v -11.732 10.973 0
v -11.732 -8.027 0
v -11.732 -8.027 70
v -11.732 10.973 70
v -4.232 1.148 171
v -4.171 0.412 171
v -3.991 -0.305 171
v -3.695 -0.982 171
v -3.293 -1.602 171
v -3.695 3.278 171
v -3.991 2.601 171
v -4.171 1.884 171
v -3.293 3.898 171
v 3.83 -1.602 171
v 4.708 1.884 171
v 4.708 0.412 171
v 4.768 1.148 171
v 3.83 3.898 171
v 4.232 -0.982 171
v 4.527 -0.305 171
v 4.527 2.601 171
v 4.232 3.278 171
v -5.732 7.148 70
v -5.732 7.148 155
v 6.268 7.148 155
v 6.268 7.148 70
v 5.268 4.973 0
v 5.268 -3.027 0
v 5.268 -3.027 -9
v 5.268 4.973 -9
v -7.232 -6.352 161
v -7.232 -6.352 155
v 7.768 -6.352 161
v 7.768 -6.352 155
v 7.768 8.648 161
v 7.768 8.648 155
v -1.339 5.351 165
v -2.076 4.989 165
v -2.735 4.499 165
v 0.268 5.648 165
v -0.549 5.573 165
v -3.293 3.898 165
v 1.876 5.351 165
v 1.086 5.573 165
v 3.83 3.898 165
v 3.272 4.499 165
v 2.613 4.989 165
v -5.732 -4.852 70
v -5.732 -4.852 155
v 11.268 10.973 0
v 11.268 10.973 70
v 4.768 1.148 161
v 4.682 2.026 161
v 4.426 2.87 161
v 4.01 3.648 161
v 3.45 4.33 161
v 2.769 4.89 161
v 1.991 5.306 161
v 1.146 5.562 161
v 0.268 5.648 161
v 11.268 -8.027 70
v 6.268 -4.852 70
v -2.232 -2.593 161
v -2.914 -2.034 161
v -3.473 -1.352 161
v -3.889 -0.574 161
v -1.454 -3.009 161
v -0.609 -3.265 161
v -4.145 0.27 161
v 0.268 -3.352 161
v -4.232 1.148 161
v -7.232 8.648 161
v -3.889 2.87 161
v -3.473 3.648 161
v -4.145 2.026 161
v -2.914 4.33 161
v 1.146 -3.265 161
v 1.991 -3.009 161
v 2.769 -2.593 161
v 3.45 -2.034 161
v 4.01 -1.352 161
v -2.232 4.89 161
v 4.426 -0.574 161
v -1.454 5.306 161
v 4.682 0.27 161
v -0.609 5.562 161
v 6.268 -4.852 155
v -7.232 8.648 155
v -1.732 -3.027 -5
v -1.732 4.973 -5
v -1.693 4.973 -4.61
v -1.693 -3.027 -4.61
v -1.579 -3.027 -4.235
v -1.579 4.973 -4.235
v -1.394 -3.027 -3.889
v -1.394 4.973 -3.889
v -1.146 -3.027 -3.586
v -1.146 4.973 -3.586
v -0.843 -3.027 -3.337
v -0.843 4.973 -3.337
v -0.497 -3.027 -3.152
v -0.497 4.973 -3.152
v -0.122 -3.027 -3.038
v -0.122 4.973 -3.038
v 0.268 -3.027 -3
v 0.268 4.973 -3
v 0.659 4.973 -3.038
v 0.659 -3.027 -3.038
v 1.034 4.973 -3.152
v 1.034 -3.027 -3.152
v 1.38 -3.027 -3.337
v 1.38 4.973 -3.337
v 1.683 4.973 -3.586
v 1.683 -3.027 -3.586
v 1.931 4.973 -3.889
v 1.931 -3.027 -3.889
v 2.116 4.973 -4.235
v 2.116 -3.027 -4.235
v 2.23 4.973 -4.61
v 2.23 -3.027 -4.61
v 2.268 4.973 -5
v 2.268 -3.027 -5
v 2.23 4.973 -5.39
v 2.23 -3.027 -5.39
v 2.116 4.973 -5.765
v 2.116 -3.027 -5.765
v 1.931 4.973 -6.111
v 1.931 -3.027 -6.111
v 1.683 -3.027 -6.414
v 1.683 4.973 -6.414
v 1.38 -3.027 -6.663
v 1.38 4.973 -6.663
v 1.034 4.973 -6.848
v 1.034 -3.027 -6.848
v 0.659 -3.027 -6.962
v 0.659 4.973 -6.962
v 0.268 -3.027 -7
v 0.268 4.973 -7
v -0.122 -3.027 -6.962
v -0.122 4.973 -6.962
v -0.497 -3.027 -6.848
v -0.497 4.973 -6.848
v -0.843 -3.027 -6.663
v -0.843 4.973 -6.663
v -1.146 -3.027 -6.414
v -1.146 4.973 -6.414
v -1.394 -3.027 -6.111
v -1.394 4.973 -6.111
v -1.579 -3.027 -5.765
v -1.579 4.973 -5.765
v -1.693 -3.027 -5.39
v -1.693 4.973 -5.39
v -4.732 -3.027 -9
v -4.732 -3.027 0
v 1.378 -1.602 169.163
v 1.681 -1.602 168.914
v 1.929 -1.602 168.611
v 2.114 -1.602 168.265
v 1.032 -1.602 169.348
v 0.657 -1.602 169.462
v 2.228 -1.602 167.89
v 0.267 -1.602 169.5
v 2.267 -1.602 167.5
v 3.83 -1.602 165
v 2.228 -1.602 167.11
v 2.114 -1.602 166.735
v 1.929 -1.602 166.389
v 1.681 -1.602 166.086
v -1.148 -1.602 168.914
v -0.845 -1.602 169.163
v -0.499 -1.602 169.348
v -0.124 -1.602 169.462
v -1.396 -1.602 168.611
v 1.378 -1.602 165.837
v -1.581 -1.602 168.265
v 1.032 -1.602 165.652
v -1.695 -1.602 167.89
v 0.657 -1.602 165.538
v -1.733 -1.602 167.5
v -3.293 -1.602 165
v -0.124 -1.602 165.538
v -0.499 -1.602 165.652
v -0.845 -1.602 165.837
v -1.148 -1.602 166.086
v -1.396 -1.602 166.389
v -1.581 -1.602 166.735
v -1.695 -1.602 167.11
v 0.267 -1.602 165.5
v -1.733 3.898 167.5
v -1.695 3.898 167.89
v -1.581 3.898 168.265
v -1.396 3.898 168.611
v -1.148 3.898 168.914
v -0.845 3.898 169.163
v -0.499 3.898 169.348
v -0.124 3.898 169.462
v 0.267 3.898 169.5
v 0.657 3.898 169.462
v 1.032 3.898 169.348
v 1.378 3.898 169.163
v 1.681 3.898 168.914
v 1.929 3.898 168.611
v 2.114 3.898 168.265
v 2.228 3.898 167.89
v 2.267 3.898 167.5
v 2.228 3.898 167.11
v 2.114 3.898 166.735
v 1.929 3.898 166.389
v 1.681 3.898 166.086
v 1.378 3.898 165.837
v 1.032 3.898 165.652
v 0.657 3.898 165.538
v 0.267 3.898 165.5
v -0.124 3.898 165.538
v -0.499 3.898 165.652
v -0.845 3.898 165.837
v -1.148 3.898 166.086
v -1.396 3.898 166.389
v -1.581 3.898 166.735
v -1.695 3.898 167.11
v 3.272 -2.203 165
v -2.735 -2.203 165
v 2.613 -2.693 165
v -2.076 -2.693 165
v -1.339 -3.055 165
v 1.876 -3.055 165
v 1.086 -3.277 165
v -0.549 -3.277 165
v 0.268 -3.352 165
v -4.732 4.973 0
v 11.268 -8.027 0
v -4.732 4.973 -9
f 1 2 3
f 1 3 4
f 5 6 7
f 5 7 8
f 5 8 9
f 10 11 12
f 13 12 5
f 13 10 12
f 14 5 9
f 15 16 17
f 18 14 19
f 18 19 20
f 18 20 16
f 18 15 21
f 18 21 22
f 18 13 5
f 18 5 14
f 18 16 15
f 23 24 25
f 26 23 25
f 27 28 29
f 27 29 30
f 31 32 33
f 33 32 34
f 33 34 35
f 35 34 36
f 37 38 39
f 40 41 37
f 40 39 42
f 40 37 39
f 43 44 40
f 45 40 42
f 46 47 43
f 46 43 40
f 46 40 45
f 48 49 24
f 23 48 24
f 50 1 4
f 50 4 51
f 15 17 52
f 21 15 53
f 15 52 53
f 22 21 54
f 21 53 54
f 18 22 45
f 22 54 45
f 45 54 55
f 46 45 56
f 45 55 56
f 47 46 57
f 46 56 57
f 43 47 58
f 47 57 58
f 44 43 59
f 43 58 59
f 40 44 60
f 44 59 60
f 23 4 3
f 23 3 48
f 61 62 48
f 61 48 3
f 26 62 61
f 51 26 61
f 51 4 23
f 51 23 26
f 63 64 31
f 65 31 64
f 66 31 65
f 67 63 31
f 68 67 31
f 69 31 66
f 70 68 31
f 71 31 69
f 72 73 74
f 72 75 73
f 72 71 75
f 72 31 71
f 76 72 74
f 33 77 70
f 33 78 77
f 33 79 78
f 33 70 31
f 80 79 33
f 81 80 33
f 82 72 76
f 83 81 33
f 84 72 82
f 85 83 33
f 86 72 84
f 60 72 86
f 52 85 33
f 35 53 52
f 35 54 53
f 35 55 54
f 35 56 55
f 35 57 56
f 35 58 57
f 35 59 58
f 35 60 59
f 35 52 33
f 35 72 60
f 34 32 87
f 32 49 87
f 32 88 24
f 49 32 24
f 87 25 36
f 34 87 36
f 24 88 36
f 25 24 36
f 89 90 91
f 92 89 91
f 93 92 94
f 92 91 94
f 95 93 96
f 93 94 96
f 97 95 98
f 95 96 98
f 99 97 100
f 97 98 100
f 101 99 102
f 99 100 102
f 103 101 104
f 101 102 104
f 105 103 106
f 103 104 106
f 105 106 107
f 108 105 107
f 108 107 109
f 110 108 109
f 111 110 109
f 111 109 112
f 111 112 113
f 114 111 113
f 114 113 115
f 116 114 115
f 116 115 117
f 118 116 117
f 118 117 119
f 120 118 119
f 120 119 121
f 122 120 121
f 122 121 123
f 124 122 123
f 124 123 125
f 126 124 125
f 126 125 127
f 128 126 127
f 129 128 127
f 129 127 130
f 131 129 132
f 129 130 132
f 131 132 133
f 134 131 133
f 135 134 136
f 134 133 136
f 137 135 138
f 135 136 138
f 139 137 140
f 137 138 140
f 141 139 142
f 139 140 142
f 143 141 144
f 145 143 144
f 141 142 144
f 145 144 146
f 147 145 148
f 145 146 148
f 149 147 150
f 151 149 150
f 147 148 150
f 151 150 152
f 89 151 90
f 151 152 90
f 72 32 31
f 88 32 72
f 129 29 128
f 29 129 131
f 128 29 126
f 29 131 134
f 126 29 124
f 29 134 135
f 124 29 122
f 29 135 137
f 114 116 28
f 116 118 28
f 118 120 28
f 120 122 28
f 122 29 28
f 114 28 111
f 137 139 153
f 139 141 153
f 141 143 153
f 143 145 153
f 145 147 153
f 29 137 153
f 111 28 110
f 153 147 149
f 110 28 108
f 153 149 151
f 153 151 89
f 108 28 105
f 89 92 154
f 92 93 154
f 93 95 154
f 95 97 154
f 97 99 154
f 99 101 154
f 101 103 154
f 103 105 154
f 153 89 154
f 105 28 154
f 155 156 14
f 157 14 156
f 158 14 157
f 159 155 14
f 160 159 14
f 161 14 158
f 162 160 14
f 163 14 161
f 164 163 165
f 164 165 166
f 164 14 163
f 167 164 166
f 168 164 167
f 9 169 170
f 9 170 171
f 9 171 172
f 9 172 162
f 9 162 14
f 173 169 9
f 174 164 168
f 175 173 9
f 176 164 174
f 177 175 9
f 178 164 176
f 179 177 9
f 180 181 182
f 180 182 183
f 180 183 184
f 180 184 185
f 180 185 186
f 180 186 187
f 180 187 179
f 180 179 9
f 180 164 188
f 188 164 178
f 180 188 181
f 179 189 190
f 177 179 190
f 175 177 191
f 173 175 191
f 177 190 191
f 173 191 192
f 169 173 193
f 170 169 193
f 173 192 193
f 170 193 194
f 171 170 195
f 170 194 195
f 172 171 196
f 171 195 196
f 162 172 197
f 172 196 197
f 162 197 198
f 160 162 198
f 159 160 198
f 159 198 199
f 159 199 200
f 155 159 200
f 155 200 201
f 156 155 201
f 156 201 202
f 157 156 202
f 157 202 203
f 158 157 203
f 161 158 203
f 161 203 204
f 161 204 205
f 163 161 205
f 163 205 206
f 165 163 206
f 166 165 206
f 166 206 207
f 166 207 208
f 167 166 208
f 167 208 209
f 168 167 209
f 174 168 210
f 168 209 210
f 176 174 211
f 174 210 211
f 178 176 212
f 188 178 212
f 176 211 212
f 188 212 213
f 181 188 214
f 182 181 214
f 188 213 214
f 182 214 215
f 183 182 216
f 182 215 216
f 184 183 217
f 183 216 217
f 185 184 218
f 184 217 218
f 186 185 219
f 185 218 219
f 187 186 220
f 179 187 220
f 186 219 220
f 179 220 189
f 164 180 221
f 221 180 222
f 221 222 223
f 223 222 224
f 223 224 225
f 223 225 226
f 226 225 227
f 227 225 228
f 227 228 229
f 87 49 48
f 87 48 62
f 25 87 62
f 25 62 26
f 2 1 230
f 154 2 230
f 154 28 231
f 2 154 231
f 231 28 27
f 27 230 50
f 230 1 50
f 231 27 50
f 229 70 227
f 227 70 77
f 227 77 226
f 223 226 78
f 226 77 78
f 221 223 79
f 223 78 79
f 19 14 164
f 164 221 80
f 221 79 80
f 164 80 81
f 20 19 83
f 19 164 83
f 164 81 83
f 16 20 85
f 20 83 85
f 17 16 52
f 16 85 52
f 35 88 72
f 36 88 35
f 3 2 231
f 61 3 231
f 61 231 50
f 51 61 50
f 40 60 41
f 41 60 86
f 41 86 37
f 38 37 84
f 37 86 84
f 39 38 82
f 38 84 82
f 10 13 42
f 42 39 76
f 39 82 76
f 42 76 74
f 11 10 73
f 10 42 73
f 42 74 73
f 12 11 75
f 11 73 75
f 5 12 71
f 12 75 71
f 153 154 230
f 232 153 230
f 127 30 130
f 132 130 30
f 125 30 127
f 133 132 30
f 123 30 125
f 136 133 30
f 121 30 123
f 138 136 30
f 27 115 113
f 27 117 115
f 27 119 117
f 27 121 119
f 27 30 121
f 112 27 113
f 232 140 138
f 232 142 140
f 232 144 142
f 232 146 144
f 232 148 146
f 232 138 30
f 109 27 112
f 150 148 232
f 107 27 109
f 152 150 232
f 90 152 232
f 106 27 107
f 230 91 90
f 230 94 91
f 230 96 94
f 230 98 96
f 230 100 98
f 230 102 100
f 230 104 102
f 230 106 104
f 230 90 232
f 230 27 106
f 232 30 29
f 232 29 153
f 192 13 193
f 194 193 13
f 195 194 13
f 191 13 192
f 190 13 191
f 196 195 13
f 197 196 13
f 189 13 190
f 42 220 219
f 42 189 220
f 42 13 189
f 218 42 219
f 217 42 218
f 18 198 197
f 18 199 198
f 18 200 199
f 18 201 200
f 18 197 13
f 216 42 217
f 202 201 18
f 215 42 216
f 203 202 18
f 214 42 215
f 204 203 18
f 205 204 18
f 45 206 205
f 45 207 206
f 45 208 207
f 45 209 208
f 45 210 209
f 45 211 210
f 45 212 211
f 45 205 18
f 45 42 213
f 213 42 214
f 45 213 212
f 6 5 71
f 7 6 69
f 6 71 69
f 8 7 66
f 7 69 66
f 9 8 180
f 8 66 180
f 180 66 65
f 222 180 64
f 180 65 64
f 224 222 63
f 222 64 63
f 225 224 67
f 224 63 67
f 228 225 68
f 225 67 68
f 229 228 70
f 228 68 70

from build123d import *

# Parameters (mm, degrees)
SKETCH2_W           = 23
SKETCH2_H           = 19
BOSS_EXTRUDE1_DEPTH = 70
SKETCH3_W           = 10
SKETCH3_H           = 8
BOSS_EXTRUDE2_DEPTH = 9
SKETCH4_R           = 2
CUT_EXTRUDE1_DEPTH  = 73.156975517
SKETCH5_W           = 12
SKETCH5_H           = 12
BOSS_EXTRUDE3_DEPTH = 85
SKETCH6_W           = 15
SKETCH6_H           = 15
BOSS_EXTRUDE4_DEPTH = 6
BOSS_EXTRUDE5_DEPTH = 10
CUT_EXTRUDE2_START  = -6
CUT_EXTRUDE2_DEPTH  = 6
SKETCH9_R           = 2
CUT_EXTRUDE3_DEPTH  = 172.816281943


with BuildPart() as part:
    # Sketch2 → Boss-Extrude1 (new body)
    with BuildSketch(Plane.XY):
        with Locations((-0.231543624, 1.473154362)):
            Rectangle(SKETCH2_W, SKETCH2_H)
    extrude(amount=BOSS_EXTRUDE1_DEPTH)

    # Sketch3 → Boss-Extrude2 (add)
    with BuildSketch(Plane(origin=(0, 0, 0), x_dir=(-1, 0, 0), z_dir=(0, 0, -1))):
        with Locations((-0.268456376, 0.973154362)):
            Rectangle(SKETCH3_W, SKETCH3_H)
    extrude(amount=BOSS_EXTRUDE2_DEPTH)

    # Sketch4 → Cut-Extrude1 (cut, through all)
    with BuildSketch(Plane(origin=(0, 4.973154362, 0), x_dir=(1, 0, 0), z_dir=(0, 1, 0))):
        with Locations(Location((0.268456376, 5, 0), (0, 0, 180))):
            Circle(SKETCH4_R)
    extrude(amount=-CUT_EXTRUDE1_DEPTH, mode=Mode.SUBTRACT)

    # Sketch5 → Boss-Extrude3 (add)
    with BuildSketch(Plane.XY.offset(70)):
        with Locations((0.268456376, 1.148154362)):
            Rectangle(SKETCH5_W, SKETCH5_H)
    extrude(amount=BOSS_EXTRUDE3_DEPTH)

    # Sketch6 → Boss-Extrude4 (add)
    with BuildSketch(Plane.XY.offset(155)):
        with Locations((0.268456376, 1.148154362)):
            Rectangle(SKETCH6_W, SKETCH6_H)
    extrude(amount=BOSS_EXTRUDE4_DEPTH)

    # Sketch7 → Boss-Extrude5 (add)
    with BuildSketch(Plane.XY.offset(161)):
        with BuildLine():
            ThreePointArc((-4.231543624, 1.148154362), (-2.91352414, -2.033826153), (0.268456376, -3.351845638))
            Line((0.268456376, -3.351845638), (0.268456376, 1.148154362))
            Line((0.268456376, 1.148154362), (-4.231543624, 1.148154362))
        make_face()
        with BuildLine():
            Line((0.268456376, 1.148154362), (0.268456376, -3.351845638))
            ThreePointArc((0.268456376, -3.351845638), (3.450436891, -2.033826153), (4.768456376, 1.148154362))
            Line((4.768456376, 1.148154362), (0.268456376, 1.148154362))
        make_face()
        with BuildLine():
            Line((-4.231543624, 1.148154362), (0.268456376, 1.148154362))
            Line((0.268456376, 1.148154362), (0.268456376, 5.648154362))
            ThreePointArc((0.268456376, 5.648154362), (-2.91352414, 4.330134878), (-4.231543624, 1.148154362))
        make_face()
        with BuildLine():
            Line((0.268456376, 5.648154362), (0.268456376, 1.148154362))
            Line((0.268456376, 1.148154362), (4.768456376, 1.148154362))
            ThreePointArc((4.768456376, 1.148154362), (3.450436891, 4.330134878), (0.268456376, 5.648154362))
        make_face()
        with BuildLine():
            ThreePointArc((-4.231543624, 1.148154362), (-2.91352414, -2.033826153), (0.268456376, -3.351845638))
            Line((0.268456376, -3.351845638), (0.268456376, 1.148154362))
            Line((0.268456376, 1.148154362), (-4.231543624, 1.148154362))
        make_face()
        with BuildLine():
            Line((0.268456376, 1.148154362), (0.268456376, -3.351845638))
            ThreePointArc((0.268456376, -3.351845638), (3.450436891, -2.033826153), (4.768456376, 1.148154362))
            Line((4.768456376, 1.148154362), (0.268456376, 1.148154362))
        make_face()
        with BuildLine():
            Line((-4.231543624, 1.148154362), (0.268456376, 1.148154362))
            Line((0.268456376, 1.148154362), (0.268456376, 5.648154362))
            ThreePointArc((0.268456376, 5.648154362), (-2.91352414, 4.330134878), (-4.231543624, 1.148154362))
        make_face()
        with BuildLine():
            Line((0.268456376, 5.648154362), (0.268456376, 1.148154362))
            Line((0.268456376, 1.148154362), (4.768456376, 1.148154362))
            ThreePointArc((4.768456376, 1.148154362), (3.450436891, 4.330134878), (0.268456376, 5.648154362))
        make_face()
        with BuildLine():
            ThreePointArc((-4.231543624, 1.148154362), (-2.91352414, -2.033826153), (0.268456376, -3.351845638))
            Line((0.268456376, -3.351845638), (0.268456376, 1.148154362))
            Line((0.268456376, 1.148154362), (-4.231543624, 1.148154362))
        make_face()
        with BuildLine():
            Line((0.268456376, 1.148154362), (0.268456376, -3.351845638))
            ThreePointArc((0.268456376, -3.351845638), (3.450436891, -2.033826153), (4.768456376, 1.148154362))
            Line((4.768456376, 1.148154362), (0.268456376, 1.148154362))
        make_face()
        with BuildLine():
            Line((-4.231543624, 1.148154362), (0.268456376, 1.148154362))
            Line((0.268456376, 1.148154362), (0.268456376, 5.648154362))
            ThreePointArc((0.268456376, 5.648154362), (-2.91352414, 4.330134878), (-4.231543624, 1.148154362))
        make_face()
        with BuildLine():
            Line((0.268456376, 5.648154362), (0.268456376, 1.148154362))
            Line((0.268456376, 1.148154362), (4.768456376, 1.148154362))
            ThreePointArc((4.768456376, 1.148154362), (3.450436891, 4.330134878), (0.268456376, 5.648154362))
        make_face()
        with BuildLine():
            ThreePointArc((-4.231543624, 1.148154362), (-2.91352414, -2.033826153), (0.268456376, -3.351845638))
            Line((0.268456376, -3.351845638), (0.268456376, 1.148154362))
            Line((0.268456376, 1.148154362), (-4.231543624, 1.148154362))
        make_face()
        with BuildLine():
            Line((0.268456376, 1.148154362), (0.268456376, -3.351845638))
            ThreePointArc((0.268456376, -3.351845638), (3.450436891, -2.033826153), (4.768456376, 1.148154362))
            Line((4.768456376, 1.148154362), (0.268456376, 1.148154362))
        make_face()
        with BuildLine():
            Line((-4.231543624, 1.148154362), (0.268456376, 1.148154362))
            Line((0.268456376, 1.148154362), (0.268456376, 5.648154362))
            ThreePointArc((0.268456376, 5.648154362), (-2.91352414, 4.330134878), (-4.231543624, 1.148154362))
        make_face()
        with BuildLine():
            Line((0.268456376, 5.648154362), (0.268456376, 1.148154362))
            Line((0.268456376, 1.148154362), (4.768456376, 1.148154362))
            ThreePointArc((4.768456376, 1.148154362), (3.450436891, 4.330134878), (0.268456376, 5.648154362))
        make_face()
    extrude(amount=BOSS_EXTRUDE5_DEPTH)

    # Sketch8 → Cut-Extrude2 (cut)
    with BuildSketch(Plane.XY.offset(171).offset(CUT_EXTRUDE2_START)):
        with BuildLine():
            Line((-3.293495336, 3.898154362), (0.268456376, 3.898154362))
            Line((0.268456376, 3.898154362), (0.268456376, 5.648154362))
            ThreePointArc((0.268456376, 5.648154362), (-1.715857107, 5.187027968), (-3.293495336, 3.898154362))
        make_face()
        with BuildLine():
            Line((0.268456376, 5.648154362), (0.268456376, 3.898154362))
            Line((0.268456376, 3.898154362), (3.830408088, 3.898154362))
            ThreePointArc((3.830408088, 3.898154362), (2.252769859, 5.187027968), (0.268456376, 5.648154362))
        make_face()
        with BuildLine():
            Line((-3.293495336, 3.898154362), (0.268456376, 3.898154362))
            Line((0.268456376, 3.898154362), (0.268456376, 5.648154362))
            ThreePointArc((0.268456376, 5.648154362), (-1.715857107, 5.187027968), (-3.293495336, 3.898154362))
        make_face()
        with BuildLine():
            Line((0.268456376, 5.648154362), (0.268456376, 3.898154362))
            Line((0.268456376, 3.898154362), (3.830408088, 3.898154362))
            ThreePointArc((3.830408088, 3.898154362), (2.252769859, 5.187027968), (0.268456376, 5.648154362))
        make_face()
        with BuildLine():
            ThreePointArc((-3.293495336, -1.601845638), (-1.715857107, -2.890719243), (0.268456376, -3.351845638))
            Line((0.268456376, -3.351845638), (0.268456376, -1.601845638))
            Line((0.268456376, -1.601845638), (-3.293495336, -1.601845638))
        make_face()
        with BuildLine():
            Line((0.268456376, -1.601845638), (0.268456376, -3.351845638))
            ThreePointArc((0.268456376, -3.351845638), (2.252769859, -2.890719243), (3.830408088, -1.601845638))
            Line((3.830408088, -1.601845638), (0.268456376, -1.601845638))
        make_face()
        with BuildLine():
            ThreePointArc((-3.293495336, -1.601845638), (-1.715857107, -2.890719243), (0.268456376, -3.351845638))
            Line((0.268456376, -3.351845638), (0.268456376, -1.601845638))
            Line((0.268456376, -1.601845638), (-3.293495336, -1.601845638))
        make_face()
        with BuildLine():
            Line((0.268456376, -1.601845638), (0.268456376, -3.351845638))
            ThreePointArc((0.268456376, -3.351845638), (2.252769859, -2.890719243), (3.830408088, -1.601845638))
            Line((3.830408088, -1.601845638), (0.268456376, -1.601845638))
        make_face()
    extrude(amount=CUT_EXTRUDE2_DEPTH, mode=Mode.SUBTRACT)

    # Sketch9 → Cut-Extrude3 (cut, through all)
    with BuildSketch(Plane(origin=(0, 3.898154362, 0), x_dir=(1, 0, 0), z_dir=(0, 1, 0))):
        with Locations(Location((0.266504664, -167.5, 0), (0, 0, 180))):
            Circle(SKETCH9_R)
    extrude(amount=-CUT_EXTRUDE3_DEPTH, mode=Mode.SUBTRACT)


solid = part.part
